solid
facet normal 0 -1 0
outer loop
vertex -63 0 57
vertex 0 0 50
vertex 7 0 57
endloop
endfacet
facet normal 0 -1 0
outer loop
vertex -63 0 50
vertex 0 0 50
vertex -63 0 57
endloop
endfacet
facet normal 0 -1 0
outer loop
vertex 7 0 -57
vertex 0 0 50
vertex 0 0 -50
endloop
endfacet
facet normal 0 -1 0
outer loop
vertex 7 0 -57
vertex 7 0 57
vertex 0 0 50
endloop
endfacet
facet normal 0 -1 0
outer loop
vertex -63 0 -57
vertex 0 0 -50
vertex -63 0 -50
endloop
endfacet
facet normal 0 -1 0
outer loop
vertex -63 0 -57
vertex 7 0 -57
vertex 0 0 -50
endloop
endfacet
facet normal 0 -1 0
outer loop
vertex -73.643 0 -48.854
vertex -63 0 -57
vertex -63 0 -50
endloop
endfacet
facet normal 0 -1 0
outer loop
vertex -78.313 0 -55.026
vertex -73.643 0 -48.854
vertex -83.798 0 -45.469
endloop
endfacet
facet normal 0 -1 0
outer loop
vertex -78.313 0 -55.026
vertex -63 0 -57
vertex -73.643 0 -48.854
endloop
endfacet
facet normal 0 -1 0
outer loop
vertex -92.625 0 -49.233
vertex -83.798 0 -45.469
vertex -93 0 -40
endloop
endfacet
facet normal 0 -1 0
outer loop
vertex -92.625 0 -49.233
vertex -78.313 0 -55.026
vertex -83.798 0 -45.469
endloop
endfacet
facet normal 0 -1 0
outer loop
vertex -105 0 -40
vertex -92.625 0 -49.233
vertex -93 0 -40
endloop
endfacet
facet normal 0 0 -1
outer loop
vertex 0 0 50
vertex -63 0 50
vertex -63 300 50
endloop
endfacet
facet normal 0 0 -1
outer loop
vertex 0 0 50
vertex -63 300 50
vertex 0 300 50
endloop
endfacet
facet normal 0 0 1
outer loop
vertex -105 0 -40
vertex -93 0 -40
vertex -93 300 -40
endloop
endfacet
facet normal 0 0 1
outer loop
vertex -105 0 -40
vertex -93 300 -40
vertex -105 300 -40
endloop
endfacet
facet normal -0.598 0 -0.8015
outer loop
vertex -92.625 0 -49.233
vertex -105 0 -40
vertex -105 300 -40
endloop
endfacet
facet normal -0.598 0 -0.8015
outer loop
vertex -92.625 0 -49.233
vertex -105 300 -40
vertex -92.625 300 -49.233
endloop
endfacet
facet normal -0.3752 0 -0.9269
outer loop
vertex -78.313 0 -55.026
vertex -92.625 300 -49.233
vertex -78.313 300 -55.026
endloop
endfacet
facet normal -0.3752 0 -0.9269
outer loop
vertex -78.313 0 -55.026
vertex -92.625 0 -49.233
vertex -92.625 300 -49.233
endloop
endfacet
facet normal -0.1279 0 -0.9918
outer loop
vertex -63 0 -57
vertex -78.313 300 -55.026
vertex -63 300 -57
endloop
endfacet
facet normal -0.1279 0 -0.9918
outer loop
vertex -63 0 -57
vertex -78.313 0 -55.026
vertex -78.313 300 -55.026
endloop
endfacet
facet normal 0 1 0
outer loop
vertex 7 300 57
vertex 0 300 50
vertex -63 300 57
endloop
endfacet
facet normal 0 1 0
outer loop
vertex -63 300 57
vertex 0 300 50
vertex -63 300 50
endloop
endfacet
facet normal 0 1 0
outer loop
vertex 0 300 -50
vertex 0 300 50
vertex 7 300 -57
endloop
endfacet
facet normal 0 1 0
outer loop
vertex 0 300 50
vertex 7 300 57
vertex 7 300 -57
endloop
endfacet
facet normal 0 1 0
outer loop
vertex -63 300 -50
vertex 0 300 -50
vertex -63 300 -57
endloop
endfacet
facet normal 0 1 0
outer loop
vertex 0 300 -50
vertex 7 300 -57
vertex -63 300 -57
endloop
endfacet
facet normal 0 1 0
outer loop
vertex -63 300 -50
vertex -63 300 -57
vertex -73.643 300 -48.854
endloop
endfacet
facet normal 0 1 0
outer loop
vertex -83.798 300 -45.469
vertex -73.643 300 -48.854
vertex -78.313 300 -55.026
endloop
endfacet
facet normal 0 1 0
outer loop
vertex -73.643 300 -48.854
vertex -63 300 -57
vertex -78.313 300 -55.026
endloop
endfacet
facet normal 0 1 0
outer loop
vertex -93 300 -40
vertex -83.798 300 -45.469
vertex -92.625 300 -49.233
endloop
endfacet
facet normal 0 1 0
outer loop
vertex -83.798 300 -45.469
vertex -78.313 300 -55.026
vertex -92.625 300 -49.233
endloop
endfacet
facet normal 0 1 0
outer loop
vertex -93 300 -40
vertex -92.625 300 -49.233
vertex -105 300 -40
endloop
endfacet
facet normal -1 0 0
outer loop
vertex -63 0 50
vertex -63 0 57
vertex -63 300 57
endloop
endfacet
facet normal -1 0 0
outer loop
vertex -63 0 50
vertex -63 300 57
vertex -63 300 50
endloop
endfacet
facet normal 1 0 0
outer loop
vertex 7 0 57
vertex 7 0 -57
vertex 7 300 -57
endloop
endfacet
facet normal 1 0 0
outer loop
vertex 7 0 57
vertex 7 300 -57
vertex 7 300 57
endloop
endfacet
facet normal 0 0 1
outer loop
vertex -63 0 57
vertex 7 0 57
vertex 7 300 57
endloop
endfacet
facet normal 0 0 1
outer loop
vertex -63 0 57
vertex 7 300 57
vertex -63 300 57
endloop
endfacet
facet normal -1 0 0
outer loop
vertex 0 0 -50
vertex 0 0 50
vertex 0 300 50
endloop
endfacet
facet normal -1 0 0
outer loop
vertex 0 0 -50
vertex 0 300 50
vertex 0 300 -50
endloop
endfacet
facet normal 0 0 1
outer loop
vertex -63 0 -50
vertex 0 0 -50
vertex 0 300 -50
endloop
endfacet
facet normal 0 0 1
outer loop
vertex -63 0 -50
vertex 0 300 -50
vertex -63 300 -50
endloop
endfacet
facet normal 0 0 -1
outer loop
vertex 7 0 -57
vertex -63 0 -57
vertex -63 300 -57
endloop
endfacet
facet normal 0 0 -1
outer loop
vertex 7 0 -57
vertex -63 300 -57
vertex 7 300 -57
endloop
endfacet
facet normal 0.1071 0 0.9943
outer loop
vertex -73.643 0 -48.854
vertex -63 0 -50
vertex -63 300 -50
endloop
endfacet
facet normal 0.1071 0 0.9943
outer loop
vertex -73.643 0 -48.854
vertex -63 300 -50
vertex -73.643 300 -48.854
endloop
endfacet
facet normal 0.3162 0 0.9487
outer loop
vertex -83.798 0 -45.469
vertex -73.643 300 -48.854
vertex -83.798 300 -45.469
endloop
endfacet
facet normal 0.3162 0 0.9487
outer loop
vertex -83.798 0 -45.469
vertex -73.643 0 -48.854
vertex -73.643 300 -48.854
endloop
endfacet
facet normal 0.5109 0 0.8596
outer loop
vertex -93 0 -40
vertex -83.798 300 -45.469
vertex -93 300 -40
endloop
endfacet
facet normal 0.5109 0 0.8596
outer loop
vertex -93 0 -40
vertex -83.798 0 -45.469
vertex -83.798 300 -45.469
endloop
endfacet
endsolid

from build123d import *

# Parameters (mm, degrees)
BOSS_EXTRUDE2_DEPTH = 300


with BuildPart() as part:
    # Sketch1 → Boss-Extrude2 (new body)
    with BuildSketch(Plane(origin=(0, 0, 0), x_dir=(1, 0, 0), z_dir=(0, 1, 0))):
        with BuildLine():
            Line((7, 57), (7, -57))
            Line((7, -57), (-63, -57))
            Line((-63, -57), (-63, -50))
            Line((-63, -50), (0, -50))
            Line((0, -50), (0, 50))
            Line((0, 50), (-63, 50))
            ThreePointArc((-63, 50), (-78.811388301, 47.434164903), (-93, 40))
            Line((-93, 40), (-105, 40))
            ThreePointArc((-105, 40), (-85.655021518, 52.588876693), (-63, 57))
            Line((-63, 57), (7, 57))
        make_face()
    extrude(amount=BOSS_EXTRUDE2_DEPTH)


solid = part.part
